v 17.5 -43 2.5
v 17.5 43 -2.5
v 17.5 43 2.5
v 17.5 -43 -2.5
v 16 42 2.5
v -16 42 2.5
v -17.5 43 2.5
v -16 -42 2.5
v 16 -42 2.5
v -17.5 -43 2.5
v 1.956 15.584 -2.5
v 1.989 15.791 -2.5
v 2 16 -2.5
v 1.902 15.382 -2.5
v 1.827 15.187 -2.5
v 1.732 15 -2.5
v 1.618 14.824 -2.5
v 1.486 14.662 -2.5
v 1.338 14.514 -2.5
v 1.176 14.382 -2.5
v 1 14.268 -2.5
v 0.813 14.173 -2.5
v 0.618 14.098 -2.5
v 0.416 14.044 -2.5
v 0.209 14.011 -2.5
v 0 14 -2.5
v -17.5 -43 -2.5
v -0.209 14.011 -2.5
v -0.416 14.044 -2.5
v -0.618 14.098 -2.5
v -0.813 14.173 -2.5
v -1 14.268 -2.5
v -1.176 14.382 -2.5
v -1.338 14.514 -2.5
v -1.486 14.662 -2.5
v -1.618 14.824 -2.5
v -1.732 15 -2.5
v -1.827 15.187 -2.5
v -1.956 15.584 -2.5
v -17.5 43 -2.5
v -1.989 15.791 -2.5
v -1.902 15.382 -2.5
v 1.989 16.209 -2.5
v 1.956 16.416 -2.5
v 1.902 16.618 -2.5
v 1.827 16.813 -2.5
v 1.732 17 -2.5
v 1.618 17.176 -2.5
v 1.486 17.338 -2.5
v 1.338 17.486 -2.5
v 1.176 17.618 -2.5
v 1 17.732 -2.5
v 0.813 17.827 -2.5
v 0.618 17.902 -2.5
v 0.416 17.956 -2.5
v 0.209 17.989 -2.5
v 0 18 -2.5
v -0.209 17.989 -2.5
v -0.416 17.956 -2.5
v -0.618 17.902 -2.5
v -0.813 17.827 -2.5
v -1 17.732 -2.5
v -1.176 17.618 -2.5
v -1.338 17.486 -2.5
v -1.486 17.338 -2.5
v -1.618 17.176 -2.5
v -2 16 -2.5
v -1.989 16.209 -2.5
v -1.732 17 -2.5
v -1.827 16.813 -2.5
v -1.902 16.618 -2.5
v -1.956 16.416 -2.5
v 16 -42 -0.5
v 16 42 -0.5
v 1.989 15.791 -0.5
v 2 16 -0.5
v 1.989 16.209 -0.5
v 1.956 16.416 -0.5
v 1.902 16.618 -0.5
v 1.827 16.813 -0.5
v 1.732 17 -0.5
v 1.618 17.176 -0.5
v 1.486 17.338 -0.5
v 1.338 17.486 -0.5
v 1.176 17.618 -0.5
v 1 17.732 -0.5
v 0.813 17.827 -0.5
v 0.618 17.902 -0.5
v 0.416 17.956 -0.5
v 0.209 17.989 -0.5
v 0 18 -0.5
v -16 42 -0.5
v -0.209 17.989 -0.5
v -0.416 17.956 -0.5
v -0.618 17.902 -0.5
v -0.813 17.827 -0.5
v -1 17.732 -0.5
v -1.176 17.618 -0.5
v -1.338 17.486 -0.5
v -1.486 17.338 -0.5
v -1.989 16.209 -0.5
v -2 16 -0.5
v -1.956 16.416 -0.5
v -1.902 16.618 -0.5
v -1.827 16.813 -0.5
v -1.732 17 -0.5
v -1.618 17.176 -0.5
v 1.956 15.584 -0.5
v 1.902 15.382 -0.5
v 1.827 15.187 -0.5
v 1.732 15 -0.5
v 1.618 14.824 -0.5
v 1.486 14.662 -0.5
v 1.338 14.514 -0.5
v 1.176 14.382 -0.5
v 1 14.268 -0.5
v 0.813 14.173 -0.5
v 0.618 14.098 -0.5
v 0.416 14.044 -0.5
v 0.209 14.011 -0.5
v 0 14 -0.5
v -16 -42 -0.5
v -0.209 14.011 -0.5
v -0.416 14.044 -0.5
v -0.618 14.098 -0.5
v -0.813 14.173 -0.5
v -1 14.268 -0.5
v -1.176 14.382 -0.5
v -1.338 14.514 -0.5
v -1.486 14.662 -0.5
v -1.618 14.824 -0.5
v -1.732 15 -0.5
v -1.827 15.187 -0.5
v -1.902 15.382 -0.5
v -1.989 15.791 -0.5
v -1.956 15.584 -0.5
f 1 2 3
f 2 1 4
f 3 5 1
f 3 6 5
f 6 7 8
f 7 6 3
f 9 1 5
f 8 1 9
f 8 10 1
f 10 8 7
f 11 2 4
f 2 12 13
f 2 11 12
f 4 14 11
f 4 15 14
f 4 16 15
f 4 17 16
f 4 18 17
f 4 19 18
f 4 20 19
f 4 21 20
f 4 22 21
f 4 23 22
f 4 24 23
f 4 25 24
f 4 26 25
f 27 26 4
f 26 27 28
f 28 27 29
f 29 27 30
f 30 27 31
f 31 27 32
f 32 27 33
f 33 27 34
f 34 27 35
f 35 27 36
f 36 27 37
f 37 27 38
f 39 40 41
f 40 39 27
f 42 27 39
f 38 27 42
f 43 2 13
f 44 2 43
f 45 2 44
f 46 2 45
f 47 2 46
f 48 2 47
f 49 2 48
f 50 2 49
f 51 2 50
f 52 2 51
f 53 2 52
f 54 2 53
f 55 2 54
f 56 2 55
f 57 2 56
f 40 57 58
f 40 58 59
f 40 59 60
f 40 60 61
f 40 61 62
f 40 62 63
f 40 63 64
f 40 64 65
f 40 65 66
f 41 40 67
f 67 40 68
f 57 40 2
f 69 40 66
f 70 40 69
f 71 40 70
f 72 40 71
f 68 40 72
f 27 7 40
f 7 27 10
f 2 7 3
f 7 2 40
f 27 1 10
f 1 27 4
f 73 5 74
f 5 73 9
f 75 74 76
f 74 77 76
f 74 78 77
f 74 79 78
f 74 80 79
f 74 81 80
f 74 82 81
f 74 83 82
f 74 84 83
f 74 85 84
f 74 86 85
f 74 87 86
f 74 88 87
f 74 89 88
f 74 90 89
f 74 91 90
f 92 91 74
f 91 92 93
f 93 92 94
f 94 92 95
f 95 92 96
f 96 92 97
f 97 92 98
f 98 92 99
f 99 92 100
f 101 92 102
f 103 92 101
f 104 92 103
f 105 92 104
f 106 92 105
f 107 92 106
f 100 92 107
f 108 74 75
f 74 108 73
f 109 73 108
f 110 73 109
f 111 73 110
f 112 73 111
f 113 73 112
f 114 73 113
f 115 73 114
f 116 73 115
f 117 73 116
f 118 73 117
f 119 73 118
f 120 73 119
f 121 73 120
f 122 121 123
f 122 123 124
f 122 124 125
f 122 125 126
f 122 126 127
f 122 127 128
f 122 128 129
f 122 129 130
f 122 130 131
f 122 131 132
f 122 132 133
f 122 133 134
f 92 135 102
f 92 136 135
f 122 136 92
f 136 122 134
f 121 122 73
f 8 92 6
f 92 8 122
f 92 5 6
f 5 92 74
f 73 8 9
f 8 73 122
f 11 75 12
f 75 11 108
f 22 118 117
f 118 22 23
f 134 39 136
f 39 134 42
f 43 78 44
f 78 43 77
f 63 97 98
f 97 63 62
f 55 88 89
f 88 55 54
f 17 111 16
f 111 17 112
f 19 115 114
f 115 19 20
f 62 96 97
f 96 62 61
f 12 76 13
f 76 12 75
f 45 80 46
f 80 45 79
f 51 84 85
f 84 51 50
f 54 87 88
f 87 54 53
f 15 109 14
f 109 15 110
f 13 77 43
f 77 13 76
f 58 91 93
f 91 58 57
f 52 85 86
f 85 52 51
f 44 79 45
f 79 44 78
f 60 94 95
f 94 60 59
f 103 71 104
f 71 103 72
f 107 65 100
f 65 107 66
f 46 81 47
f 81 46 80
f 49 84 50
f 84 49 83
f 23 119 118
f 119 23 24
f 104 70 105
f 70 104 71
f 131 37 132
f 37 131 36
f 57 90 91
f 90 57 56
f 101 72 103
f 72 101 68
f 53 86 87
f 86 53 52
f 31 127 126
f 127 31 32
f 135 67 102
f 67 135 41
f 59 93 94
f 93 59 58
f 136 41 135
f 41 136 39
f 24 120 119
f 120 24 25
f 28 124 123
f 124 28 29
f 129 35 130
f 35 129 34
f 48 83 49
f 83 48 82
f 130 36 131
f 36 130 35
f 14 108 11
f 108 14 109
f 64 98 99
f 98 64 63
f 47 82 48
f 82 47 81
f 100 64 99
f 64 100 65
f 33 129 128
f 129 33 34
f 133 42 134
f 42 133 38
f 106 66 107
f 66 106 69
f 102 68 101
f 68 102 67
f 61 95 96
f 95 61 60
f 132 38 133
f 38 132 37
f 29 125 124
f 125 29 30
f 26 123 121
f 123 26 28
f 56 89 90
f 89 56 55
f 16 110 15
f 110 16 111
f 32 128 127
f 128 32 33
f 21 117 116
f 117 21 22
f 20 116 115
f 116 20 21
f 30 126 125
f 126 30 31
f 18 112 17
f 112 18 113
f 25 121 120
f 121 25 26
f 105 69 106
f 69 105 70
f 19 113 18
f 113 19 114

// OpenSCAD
bottom_width = 35;
box_length   = 86;
box_height   = 5.0;

platformWidth = 32;
platformHeight = 84;

widthDelta = (bottom_width-platformWidth);
lengthDelta = (box_length-platformHeight);

floor_thickness = 2.0;
skirtHeight = 3.0;

// Measured from outer edge....
holeLocationMeas = 26.0;
holeLocation = platformHeight/2 - holeLocationMeas;
holeSize = 4;

difference() {
    cube([bottom_width, box_length, box_height],center=true);
    
    translate([0, 0, floor_thickness])
    cube([bottom_width-widthDelta, box_length-lengthDelta, box_height],center=true);
    
    translate([0, holeLocation, 0])
    cylinder(h = 10, d = holeSize, center=true, $fn=60);
    
}
